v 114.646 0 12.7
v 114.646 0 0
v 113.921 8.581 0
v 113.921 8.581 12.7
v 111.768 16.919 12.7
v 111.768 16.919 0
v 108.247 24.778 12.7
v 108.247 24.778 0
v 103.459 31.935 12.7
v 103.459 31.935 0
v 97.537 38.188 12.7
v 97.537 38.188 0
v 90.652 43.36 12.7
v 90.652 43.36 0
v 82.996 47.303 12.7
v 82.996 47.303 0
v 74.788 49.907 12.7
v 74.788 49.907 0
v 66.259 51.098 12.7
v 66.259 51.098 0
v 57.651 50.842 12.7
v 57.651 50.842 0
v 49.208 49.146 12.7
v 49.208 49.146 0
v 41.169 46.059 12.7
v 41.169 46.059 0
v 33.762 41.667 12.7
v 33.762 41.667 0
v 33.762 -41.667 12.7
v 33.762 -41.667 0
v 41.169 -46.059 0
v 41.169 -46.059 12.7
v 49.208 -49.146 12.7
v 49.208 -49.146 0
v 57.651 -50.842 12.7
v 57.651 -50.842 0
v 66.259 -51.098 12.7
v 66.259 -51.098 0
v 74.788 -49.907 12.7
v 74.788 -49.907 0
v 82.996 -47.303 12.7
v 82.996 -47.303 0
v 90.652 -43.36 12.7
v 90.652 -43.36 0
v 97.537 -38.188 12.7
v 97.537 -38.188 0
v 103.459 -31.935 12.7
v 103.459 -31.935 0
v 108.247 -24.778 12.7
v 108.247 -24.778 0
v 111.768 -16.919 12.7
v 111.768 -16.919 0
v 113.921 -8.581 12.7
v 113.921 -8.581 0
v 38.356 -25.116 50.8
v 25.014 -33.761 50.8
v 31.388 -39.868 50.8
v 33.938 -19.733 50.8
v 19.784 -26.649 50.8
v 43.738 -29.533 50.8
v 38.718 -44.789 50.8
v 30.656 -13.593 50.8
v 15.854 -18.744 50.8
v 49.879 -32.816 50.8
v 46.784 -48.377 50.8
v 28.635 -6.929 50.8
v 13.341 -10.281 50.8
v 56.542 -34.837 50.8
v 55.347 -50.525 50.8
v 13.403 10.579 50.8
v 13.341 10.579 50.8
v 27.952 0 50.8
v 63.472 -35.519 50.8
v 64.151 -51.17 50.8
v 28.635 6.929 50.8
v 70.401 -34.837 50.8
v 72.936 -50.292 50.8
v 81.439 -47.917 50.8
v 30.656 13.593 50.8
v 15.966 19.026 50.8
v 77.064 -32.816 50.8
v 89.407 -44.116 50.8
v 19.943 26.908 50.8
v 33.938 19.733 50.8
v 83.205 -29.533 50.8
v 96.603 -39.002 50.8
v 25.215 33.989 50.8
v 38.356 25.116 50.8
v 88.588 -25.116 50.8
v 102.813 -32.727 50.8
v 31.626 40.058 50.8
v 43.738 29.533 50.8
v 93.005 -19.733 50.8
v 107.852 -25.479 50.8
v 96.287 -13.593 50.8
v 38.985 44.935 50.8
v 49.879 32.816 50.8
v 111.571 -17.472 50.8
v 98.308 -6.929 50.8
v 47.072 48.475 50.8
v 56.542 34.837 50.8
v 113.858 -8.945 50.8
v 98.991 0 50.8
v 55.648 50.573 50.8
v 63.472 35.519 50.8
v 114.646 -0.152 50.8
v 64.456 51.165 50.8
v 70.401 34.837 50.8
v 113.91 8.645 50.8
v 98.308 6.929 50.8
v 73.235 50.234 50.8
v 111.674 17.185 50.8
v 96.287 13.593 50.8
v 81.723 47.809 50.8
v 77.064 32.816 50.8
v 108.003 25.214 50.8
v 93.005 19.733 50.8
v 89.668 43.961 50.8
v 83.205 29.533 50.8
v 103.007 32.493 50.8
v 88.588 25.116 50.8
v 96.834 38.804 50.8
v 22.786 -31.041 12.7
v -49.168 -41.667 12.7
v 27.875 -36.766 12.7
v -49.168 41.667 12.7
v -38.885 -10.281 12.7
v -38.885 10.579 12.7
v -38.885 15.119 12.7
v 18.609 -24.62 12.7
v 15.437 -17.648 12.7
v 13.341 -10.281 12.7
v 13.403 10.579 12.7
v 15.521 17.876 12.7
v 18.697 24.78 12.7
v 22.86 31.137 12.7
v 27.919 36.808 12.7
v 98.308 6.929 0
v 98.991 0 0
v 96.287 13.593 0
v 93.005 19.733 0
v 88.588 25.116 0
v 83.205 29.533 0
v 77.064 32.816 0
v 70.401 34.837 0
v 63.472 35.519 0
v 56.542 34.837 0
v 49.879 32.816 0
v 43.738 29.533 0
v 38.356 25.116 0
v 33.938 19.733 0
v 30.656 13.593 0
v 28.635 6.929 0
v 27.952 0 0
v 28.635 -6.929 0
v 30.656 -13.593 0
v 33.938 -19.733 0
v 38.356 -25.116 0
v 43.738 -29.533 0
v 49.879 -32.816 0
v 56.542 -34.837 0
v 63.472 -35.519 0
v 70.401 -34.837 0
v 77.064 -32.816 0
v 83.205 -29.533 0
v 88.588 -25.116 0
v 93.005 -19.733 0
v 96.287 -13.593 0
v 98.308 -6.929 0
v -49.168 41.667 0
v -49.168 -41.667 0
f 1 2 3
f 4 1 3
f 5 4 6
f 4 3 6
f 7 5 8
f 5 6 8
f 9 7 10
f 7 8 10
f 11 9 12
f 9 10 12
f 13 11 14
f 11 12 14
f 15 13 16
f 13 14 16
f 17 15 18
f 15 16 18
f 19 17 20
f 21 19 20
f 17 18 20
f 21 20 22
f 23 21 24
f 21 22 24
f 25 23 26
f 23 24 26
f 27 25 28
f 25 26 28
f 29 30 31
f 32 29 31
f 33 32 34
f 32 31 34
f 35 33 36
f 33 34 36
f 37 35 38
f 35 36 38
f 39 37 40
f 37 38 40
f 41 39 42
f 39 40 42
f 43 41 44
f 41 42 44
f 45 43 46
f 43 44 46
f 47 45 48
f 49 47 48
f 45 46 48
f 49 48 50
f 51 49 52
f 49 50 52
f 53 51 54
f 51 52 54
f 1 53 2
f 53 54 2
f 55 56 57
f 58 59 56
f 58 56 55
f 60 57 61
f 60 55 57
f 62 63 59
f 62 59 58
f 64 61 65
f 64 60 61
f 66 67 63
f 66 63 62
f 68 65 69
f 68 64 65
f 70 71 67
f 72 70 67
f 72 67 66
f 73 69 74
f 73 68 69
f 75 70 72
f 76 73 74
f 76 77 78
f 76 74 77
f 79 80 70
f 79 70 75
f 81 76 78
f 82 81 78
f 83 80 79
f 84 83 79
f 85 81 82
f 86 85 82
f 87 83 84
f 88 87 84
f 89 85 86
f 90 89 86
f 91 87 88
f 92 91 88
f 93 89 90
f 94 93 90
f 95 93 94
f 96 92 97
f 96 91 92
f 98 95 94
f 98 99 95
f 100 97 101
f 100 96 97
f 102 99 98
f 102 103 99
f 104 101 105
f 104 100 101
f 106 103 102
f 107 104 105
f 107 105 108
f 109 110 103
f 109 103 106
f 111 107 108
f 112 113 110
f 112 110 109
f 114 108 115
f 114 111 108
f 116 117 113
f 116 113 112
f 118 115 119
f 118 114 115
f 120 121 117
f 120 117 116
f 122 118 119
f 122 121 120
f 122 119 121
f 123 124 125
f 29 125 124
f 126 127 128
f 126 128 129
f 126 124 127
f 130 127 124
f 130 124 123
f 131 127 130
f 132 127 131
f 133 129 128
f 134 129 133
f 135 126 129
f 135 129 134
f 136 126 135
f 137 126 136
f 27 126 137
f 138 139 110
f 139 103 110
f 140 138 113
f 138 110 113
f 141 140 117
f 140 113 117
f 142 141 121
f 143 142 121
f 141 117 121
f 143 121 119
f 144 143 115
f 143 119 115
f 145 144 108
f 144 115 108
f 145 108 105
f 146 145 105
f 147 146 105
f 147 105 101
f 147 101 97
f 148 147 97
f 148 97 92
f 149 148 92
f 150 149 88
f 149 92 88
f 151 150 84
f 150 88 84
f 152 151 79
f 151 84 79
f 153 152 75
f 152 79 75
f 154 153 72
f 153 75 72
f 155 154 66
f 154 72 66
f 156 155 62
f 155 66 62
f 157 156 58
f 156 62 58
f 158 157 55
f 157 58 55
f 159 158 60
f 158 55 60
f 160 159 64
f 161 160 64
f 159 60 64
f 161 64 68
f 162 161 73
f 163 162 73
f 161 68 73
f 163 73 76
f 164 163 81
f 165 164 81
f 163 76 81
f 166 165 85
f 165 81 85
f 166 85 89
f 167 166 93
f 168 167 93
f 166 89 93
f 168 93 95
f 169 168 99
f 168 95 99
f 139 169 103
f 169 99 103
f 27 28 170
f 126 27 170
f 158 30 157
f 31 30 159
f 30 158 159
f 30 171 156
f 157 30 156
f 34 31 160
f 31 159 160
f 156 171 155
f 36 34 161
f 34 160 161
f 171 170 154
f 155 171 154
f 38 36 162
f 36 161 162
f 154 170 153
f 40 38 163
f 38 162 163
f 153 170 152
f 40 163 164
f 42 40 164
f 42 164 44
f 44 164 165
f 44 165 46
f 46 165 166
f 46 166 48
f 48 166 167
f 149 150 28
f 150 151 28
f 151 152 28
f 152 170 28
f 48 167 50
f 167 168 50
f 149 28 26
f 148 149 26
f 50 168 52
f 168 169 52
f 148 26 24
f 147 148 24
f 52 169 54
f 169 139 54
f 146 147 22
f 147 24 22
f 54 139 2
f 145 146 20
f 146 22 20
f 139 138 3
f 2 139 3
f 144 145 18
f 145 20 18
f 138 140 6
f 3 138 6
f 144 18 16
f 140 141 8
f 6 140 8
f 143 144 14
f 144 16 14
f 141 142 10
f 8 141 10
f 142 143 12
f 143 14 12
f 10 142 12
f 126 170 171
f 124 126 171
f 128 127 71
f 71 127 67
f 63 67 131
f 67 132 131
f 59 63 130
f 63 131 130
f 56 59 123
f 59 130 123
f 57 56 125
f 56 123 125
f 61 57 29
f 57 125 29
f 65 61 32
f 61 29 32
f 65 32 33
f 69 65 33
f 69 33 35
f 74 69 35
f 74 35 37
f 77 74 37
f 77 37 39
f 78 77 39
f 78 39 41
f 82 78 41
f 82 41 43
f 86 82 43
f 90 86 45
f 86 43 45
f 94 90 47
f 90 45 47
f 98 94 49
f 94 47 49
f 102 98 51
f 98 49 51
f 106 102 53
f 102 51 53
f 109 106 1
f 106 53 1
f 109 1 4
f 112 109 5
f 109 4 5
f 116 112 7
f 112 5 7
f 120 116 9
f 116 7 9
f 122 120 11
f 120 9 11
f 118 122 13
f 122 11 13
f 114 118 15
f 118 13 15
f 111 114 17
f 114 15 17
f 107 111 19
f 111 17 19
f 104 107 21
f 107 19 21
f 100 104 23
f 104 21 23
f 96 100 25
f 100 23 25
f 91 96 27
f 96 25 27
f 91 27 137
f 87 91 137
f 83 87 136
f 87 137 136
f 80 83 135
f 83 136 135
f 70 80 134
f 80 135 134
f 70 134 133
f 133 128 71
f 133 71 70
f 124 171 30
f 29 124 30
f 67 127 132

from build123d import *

# Parameters (mm, degrees)
F0_R     = 29.709724
F1_DEPTH = 12.7
F2_R     = 51.174274
F2_R_2   = 35.519293
F3_DEPTH = 38.1
F4_R     = 35.519293
F5_DEPTH = 79.248
F6_W     = 55.42592
F6_H     = 20.859219
F7_DEPTH = 42.926
F9_DEPTH = 25.4


with BuildPart() as f1:
    # F0 (on Top) → F1 (new body)
    with BuildSketch(Plane.XY):
        with BuildLine():
            ThreePointArc((33.761899, -41.666997), (86.906989, -45.492746), (114.645897, 0))
            ThreePointArc((114.645897, 0), (86.906989, 45.492746), (33.761899, 41.666997))
            ThreePointArc((33.761899, 41.666997), (12.297348, 0), (33.761899, -41.666997))
        make_face()
        with Locations((63.471623, 0)):
            Circle(F0_R, mode=Mode.SUBTRACT)
        with BuildLine():
            ThreePointArc((33.761899, -41.666997), (12.297348, 0), (33.761899, 41.666997))
            Line((33.761899, 41.666997), (-49.168151, 41.666997))
            Line((-49.168151, 41.666997), (-49.168151, -41.666997))
            Line((-49.168151, -41.666997), (33.761899, -41.666997))
        make_face()
    extrude(amount=F1_DEPTH)

    # F2 (on face) → F3 (join)
    with BuildSketch(Plane.XY.offset(12.7)):
        with Locations((63.471623, 0)):
            Circle(F2_R)
        with Locations((63.471623, 0)):
            Circle(F2_R_2, mode=Mode.SUBTRACT)
    extrude(amount=F3_DEPTH)

    # F4 (on face) → F5 (cut)
    with BuildSketch(Plane.XY.offset(50.8)):
        with Locations((63.471623, 0)):
            Circle(F4_R)
    extrude(amount=-F5_DEPTH, mode=Mode.SUBTRACT)

    # F6 (on face) → F7 (join)
    with BuildSketch(Plane.XY.offset(12.7)):
        with Locations((-11.171911, 0.148995)):
            Rectangle(F6_W, F6_H)
    extrude(amount=F7_DEPTH)

    # F8 (on face) → F9 (cut)
    with BuildSketch(Plane.XZ.offset(10.280615)):
        Polygon((-38.884871, 70.77235), (-38.884871, 12.7), (13.340641, 50.8), (16.541049, 50.8), (16.541049, 70.77235), align=None)
    extrude(amount=-F9_DEPTH, mode=Mode.SUBTRACT)


solid = f1.part
